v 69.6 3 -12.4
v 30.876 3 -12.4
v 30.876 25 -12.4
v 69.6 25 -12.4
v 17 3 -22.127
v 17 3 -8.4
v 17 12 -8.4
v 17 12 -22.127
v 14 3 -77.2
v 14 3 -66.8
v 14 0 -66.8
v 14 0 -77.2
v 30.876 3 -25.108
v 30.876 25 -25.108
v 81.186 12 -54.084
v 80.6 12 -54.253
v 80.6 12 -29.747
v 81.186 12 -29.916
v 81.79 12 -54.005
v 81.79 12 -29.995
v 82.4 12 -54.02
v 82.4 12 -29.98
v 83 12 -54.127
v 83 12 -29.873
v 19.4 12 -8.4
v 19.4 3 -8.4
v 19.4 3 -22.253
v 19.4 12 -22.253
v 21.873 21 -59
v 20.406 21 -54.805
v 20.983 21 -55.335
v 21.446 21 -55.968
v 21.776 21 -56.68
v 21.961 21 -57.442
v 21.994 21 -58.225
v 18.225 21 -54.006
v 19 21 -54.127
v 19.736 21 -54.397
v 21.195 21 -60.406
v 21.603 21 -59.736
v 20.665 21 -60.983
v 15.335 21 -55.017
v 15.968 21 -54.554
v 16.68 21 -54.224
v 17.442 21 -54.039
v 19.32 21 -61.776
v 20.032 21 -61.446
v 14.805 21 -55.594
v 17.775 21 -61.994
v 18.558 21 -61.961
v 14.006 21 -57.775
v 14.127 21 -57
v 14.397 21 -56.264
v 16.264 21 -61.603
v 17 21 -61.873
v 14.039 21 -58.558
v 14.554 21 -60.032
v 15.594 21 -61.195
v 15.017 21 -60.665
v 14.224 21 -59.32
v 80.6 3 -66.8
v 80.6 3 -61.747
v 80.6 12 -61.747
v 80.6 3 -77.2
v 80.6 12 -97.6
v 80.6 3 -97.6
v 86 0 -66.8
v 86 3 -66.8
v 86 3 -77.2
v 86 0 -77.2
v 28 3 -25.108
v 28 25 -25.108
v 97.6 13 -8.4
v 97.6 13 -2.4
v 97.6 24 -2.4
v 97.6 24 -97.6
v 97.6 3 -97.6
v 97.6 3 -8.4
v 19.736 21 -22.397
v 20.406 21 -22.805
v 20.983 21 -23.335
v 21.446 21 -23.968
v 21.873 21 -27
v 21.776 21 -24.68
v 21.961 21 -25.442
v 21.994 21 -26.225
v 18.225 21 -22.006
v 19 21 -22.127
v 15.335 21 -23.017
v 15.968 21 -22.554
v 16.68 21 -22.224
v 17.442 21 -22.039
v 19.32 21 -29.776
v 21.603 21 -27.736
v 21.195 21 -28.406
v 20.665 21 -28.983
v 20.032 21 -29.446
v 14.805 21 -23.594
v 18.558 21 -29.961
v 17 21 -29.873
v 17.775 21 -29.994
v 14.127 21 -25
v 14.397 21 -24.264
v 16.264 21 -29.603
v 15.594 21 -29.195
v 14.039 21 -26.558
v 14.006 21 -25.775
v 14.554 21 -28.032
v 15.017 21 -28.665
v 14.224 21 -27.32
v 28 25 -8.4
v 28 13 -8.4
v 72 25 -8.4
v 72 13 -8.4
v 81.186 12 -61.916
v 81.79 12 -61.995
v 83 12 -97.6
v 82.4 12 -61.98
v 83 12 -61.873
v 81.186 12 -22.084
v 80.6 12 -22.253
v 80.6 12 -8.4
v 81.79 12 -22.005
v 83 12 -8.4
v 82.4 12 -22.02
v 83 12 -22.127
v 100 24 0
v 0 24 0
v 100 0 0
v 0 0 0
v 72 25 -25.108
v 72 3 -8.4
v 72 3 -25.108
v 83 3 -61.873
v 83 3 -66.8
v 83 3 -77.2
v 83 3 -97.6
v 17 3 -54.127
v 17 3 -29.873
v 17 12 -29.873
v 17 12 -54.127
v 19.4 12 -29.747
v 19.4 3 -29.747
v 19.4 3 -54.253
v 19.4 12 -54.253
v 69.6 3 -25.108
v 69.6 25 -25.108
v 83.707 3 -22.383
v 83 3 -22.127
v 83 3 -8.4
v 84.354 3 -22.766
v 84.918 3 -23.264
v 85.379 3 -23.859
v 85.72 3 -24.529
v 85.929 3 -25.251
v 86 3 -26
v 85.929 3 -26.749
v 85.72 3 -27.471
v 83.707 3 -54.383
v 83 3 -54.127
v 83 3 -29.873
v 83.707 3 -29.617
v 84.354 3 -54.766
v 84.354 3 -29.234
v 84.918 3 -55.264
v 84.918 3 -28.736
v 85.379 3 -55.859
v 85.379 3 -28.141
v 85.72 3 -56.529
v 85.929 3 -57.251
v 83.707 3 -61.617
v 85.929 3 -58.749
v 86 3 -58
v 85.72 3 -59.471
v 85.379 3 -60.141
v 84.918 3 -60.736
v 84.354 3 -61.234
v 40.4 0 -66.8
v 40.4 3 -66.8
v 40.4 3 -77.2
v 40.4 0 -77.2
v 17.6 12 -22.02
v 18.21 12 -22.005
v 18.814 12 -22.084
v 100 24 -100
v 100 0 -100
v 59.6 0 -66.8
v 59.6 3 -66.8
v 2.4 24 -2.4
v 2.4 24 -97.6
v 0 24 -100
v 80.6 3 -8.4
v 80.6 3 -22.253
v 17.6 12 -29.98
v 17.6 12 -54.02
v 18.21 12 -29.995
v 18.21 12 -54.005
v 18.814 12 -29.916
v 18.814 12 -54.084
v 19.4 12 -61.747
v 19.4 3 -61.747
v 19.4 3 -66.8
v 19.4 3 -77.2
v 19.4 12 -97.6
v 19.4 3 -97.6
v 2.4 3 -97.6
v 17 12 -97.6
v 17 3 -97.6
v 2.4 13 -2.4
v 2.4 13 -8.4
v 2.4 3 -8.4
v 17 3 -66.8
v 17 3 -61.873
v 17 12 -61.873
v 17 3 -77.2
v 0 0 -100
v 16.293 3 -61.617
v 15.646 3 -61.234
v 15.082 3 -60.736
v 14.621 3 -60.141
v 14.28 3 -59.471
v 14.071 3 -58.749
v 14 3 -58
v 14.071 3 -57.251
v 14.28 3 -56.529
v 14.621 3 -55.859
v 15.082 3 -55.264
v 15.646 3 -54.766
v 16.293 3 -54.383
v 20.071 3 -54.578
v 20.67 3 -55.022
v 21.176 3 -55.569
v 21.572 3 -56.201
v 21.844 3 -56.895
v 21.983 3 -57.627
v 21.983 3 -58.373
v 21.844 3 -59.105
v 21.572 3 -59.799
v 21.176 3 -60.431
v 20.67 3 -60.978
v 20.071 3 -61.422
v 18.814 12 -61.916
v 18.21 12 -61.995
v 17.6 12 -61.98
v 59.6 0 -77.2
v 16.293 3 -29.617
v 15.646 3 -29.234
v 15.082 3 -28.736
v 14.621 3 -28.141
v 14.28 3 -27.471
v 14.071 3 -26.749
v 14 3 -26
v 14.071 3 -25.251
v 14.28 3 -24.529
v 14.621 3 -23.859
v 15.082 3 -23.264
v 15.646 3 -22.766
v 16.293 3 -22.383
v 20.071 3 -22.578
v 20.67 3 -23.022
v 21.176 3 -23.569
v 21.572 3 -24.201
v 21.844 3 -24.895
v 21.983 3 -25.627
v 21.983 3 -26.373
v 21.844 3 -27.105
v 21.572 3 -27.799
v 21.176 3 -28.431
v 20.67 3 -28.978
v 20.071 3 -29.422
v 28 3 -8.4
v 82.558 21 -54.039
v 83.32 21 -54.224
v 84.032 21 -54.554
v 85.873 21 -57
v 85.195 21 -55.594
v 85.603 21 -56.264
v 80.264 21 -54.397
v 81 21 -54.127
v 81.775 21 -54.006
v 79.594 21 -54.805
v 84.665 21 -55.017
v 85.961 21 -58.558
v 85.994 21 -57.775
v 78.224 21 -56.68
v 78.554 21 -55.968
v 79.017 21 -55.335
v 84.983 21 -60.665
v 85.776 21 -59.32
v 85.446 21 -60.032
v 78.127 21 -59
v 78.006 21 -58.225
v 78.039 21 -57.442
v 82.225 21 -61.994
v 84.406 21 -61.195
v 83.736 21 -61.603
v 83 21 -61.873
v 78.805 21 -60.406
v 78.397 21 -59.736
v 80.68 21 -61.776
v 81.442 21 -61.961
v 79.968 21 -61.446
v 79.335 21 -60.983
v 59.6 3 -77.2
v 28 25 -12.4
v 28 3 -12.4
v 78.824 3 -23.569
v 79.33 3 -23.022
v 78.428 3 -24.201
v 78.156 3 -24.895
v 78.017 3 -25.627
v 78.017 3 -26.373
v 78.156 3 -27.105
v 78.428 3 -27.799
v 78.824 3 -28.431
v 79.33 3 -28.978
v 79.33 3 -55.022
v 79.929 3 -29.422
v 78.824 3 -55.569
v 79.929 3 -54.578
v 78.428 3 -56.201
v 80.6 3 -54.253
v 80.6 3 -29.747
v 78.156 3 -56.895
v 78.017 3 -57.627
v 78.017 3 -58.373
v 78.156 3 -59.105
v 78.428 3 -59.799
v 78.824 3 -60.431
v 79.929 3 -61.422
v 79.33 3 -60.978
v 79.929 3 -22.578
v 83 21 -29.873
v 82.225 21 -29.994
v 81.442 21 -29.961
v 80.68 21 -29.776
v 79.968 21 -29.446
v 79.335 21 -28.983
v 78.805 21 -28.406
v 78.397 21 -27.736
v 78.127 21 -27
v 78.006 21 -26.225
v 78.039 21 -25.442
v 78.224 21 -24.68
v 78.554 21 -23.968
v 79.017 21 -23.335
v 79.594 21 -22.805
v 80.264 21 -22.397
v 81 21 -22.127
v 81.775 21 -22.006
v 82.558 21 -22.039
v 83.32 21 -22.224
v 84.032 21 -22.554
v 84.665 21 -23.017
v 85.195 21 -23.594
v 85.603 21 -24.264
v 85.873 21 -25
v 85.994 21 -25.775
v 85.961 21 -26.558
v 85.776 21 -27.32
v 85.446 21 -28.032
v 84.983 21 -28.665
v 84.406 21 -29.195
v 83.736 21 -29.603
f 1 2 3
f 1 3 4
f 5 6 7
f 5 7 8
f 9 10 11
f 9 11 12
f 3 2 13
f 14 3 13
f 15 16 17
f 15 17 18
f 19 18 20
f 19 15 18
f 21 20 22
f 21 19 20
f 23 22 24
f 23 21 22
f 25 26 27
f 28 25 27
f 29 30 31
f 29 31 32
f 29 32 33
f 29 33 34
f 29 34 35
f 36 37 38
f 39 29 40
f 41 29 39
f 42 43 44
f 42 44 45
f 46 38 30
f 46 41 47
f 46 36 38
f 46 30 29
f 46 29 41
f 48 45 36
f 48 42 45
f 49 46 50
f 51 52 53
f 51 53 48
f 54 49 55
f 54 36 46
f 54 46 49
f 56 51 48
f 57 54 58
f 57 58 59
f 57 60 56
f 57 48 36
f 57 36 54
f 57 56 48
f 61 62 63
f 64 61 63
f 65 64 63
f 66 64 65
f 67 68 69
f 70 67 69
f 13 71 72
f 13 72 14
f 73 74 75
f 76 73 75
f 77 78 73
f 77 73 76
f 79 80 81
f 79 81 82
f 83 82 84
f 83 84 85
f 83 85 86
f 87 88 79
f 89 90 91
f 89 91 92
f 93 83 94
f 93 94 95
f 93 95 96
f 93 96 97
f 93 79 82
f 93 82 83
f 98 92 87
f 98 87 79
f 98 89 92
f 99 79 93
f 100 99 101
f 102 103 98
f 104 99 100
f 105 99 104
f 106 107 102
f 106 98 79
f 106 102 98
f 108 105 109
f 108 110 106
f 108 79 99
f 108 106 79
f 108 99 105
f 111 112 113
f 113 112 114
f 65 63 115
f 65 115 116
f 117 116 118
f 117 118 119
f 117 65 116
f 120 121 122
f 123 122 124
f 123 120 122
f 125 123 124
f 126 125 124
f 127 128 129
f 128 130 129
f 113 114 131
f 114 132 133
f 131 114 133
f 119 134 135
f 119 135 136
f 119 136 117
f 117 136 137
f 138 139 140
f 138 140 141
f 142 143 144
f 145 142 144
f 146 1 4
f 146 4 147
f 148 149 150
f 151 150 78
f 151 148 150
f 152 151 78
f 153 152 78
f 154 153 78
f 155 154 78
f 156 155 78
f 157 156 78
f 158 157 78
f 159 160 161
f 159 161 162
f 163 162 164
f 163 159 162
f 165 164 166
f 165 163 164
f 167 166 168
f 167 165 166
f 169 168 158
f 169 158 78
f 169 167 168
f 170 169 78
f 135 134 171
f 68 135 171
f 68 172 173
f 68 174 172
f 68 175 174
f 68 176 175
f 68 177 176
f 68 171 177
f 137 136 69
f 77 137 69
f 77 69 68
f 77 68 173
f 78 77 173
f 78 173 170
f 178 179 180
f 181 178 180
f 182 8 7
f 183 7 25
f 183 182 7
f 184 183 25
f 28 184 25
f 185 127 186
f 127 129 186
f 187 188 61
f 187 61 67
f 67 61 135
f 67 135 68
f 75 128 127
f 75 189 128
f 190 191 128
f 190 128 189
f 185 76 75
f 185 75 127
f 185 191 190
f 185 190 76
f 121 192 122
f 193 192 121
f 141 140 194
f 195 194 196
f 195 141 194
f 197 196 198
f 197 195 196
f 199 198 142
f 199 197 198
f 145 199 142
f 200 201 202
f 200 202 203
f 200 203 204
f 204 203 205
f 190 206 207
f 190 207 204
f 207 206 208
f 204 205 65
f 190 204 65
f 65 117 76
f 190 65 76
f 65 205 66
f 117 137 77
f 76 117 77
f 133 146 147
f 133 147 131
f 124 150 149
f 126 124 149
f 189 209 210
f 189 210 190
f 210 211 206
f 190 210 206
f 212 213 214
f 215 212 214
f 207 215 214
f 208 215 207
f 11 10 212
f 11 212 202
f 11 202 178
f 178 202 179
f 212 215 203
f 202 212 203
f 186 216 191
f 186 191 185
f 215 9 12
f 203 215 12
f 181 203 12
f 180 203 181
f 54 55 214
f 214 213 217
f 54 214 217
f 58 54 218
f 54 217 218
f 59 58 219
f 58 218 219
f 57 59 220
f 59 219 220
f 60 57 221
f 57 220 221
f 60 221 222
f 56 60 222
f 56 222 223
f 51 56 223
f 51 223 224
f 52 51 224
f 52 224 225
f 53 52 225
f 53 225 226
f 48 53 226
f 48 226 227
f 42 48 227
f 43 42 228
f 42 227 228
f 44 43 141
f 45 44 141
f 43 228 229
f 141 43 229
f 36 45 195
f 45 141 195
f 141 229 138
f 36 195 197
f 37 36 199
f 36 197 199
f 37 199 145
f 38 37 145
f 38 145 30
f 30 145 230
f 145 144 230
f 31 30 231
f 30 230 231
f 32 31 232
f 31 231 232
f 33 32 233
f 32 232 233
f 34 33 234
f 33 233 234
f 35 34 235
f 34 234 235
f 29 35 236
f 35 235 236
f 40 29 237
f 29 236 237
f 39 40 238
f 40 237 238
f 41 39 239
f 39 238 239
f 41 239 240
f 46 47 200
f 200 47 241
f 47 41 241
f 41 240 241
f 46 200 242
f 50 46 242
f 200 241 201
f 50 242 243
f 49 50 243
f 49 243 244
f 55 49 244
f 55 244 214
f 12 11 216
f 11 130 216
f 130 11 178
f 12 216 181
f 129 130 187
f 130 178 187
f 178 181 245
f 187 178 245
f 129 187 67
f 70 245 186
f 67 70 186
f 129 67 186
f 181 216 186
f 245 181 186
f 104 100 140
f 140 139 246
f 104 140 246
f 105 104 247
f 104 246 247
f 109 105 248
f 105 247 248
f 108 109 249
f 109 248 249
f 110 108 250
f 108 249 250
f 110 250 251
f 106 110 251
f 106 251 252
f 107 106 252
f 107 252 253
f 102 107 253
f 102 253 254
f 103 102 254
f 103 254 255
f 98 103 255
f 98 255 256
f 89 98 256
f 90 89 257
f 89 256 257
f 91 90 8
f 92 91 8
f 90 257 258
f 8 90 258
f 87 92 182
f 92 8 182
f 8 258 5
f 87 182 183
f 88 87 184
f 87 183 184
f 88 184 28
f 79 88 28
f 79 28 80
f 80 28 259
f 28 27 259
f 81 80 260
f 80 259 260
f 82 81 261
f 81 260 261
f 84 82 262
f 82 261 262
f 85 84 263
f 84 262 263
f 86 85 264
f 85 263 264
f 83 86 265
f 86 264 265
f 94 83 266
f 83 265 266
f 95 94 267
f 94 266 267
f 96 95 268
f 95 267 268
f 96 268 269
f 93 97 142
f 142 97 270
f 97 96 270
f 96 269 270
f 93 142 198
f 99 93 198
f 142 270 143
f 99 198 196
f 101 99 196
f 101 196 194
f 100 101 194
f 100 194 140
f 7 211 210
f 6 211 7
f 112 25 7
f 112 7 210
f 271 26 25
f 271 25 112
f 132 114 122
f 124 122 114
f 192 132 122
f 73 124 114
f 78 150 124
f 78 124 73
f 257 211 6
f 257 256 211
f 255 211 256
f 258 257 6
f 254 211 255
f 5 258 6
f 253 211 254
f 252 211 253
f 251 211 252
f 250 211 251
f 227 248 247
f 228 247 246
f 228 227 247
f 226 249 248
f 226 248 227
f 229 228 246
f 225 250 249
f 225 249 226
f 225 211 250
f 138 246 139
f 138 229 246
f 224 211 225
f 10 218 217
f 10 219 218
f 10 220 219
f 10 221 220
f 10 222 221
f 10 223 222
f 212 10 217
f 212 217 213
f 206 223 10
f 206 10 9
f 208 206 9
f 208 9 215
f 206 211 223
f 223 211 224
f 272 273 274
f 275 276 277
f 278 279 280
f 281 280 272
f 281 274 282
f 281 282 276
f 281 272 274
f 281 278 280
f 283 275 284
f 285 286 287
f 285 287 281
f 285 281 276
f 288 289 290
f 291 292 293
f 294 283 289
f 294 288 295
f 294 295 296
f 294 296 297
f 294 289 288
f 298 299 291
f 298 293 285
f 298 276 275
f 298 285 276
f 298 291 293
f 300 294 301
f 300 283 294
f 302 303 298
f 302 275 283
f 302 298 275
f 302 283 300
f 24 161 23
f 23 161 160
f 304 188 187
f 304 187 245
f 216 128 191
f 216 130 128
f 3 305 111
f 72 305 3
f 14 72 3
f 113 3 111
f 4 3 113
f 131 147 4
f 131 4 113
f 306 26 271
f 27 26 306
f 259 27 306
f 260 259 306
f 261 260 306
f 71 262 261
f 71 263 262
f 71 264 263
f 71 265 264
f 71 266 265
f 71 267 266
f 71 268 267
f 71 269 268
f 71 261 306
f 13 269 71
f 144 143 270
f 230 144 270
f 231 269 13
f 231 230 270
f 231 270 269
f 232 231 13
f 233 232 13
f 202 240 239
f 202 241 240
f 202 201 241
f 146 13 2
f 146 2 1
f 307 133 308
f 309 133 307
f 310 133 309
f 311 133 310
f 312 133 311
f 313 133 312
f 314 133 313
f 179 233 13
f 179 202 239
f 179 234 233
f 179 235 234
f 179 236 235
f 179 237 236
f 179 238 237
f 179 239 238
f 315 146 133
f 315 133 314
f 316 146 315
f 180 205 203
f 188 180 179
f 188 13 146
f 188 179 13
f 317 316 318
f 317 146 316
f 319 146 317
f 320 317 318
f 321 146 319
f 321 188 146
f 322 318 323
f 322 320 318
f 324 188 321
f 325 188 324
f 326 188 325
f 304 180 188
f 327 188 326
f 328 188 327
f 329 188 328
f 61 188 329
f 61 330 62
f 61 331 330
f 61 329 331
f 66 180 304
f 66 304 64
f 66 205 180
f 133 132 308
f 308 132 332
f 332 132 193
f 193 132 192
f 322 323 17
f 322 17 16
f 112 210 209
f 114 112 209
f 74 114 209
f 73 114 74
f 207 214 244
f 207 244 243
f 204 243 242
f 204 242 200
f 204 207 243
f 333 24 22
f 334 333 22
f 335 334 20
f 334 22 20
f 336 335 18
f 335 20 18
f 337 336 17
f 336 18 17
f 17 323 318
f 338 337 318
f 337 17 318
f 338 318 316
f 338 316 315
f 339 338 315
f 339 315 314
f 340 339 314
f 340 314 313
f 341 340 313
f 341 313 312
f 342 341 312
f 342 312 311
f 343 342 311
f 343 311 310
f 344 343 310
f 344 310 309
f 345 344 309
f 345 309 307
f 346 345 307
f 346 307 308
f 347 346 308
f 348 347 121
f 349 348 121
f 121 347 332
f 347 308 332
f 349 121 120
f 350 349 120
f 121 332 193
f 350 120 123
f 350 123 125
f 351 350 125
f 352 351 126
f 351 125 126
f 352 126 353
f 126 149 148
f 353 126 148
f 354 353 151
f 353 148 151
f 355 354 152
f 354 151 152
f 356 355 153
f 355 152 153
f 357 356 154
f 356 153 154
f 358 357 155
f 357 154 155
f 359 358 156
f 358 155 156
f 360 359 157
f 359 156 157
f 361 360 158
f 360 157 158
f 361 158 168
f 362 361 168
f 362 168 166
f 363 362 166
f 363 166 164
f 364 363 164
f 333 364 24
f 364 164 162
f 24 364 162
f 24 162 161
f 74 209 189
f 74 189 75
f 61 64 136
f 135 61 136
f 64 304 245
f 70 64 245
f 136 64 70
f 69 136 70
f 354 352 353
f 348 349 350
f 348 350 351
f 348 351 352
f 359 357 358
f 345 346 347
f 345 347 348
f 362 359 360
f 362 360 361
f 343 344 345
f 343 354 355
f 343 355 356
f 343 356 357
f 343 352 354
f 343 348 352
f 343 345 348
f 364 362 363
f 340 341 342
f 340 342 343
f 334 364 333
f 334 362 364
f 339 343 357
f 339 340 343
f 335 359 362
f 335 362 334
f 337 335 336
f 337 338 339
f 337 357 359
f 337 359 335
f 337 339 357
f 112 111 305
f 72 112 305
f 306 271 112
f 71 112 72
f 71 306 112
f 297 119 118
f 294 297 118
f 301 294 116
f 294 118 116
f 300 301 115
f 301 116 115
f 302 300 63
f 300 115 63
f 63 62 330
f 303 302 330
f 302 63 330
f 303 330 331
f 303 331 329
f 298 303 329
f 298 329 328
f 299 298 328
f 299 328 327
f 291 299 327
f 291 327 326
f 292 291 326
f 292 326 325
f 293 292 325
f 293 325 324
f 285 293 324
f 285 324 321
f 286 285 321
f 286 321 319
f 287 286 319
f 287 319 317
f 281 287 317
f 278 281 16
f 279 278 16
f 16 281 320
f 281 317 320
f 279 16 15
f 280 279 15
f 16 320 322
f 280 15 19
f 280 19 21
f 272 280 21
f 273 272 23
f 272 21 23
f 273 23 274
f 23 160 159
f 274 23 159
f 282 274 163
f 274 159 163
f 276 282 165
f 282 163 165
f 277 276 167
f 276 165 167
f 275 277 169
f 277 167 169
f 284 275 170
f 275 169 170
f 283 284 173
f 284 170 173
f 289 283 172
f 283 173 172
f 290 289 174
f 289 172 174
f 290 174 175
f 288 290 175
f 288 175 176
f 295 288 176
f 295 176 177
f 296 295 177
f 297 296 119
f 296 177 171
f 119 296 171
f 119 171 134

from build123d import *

# Parameters (mm, degrees)
CROQUIS1_W              = 100
CROQUIS1_H              = 100
PLACABASE_DEPTH         = 3
CROQUIS2_W              = 100
CROQUIS2_H              = 100
CROQUIS2_W_2            = 95.2
CROQUIS2_H_2            = 95.2
PAREDES_DEPTH           = 21
CROQUIS4_W              = 26.4
CROQUIS4_H              = 10.4
ALOJAMIENTOSMOTOR_DEPTH = 12.4
CROQUIS6_W              = 2.4
CROQUIS6_H              = 95.2
NERVIOSRIGIDEZ_DEPTH    = 9
CROQUIS7_W              = 95.2
CROQUIS7_H              = 6
BLOQUECUNA_DEPTH        = 10
CROQUIS8_W              = 44
CROQUIS8_H              = 4
TORRESENSORES_DEPTH     = 22
CROQUIS11_W             = 2.875664279
CROQUIS11_H             = 12.708105518
CROQUIS11_W_2           = 2.4
NERVIOSTORRE_DEPTH      = 22
CROQUIS12_R             = 4
POSTESPLACA_DEPTH       = 18


with BuildPart() as part:
    # Croquis1 → PlacaBase (new body)
    with BuildSketch(Plane(origin=(0, 0, 0), x_dir=(1, 0, 0), z_dir=(0, 1, 0))):
        with Locations((50, 50)):
            Rectangle(CROQUIS1_W, CROQUIS1_H)
    extrude(amount=PLACABASE_DEPTH)

    # Croquis2 → Paredes (add)
    with BuildSketch(Plane(origin=(0, 3, 0), x_dir=(1, 0, 0), z_dir=(0, 1, 0))):
        with Locations((50, 50)):
            Rectangle(CROQUIS2_W, CROQUIS2_H)
        with Locations((50, 50)):
            Rectangle(CROQUIS2_W_2, CROQUIS2_H_2, mode=Mode.SUBTRACT)
    extrude(amount=PAREDES_DEPTH)

    # Croquis4 → AlojamientosMotor (cut)
    with BuildSketch(Plane(origin=(0, 7.3, 0), x_dir=(1, 0, 0), z_dir=(0, 1, 0))):
        with Locations((27.2, 72)):
            Rectangle(CROQUIS4_W, CROQUIS4_H)
        with Locations((72.8, 72)):
            Rectangle(CROQUIS4_W, CROQUIS4_H)
    extrude(amount=-ALOJAMIENTOSMOTOR_DEPTH, mode=Mode.SUBTRACT)

    # Croquis6 → NerviosRigidez (add)
    with BuildSketch(Plane(origin=(0, 3, 0), x_dir=(1, 0, 0), z_dir=(0, 1, 0))):
        with Locations((18.2, 50)):
            Rectangle(CROQUIS6_W, CROQUIS6_H)
        with Locations((81.8, 50)):
            Rectangle(CROQUIS6_W, CROQUIS6_H)
    extrude(amount=NERVIOSRIGIDEZ_DEPTH)

    # Croquis7 → BloqueCuna (add)
    with BuildSketch(Plane(origin=(0, 3, 0), x_dir=(1, 0, 0), z_dir=(0, 1, 0))):
        with Locations((50, 5.4)):
            Rectangle(CROQUIS7_W, CROQUIS7_H)
    extrude(amount=BLOQUECUNA_DEPTH)

    # Croquis8 → TorreSensores (add)
    with BuildSketch(Plane(origin=(0, 3, 0), x_dir=(1, 0, 0), z_dir=(0, 1, 0))):
        with Locations((50, 10.4)):
            Rectangle(CROQUIS8_W, CROQUIS8_H)
    extrude(amount=TORRESENSORES_DEPTH)

    # Croquis11 → NerviosTorre (add)
    with BuildSketch(Plane(origin=(0, 3, 0), x_dir=(1, 0, 0), z_dir=(0, 1, 0))):
        with Locations((29.43783214, 18.754052759)):
            Rectangle(CROQUIS11_W, CROQUIS11_H)
        with Locations((70.8, 18.754052759)):
            Rectangle(CROQUIS11_W_2, CROQUIS11_H)
    extrude(amount=NERVIOSTORRE_DEPTH)

    # Croquis12 → PostesPlaca (add)
    with BuildSketch(Plane(origin=(0, 3, 0), x_dir=(1, 0, 0), z_dir=(0, 1, 0))):
        with Locations(Location((18, 26, 0), (0, 0, 104.477512186))):
            Circle(CROQUIS12_R)
        with Locations(Location((82, 26, 0), (0, 0, 75.522487814))):
            Circle(CROQUIS12_R)
        with Locations(Location((18, 58, 0), (0, 0, 104.477512186))):
            Circle(CROQUIS12_R)
        with Locations(Location((82, 58, 0), (0, 0, 75.522487814))):
            Circle(CROQUIS12_R)
    extrude(amount=POSTESPLACA_DEPTH)


solid = part.part
